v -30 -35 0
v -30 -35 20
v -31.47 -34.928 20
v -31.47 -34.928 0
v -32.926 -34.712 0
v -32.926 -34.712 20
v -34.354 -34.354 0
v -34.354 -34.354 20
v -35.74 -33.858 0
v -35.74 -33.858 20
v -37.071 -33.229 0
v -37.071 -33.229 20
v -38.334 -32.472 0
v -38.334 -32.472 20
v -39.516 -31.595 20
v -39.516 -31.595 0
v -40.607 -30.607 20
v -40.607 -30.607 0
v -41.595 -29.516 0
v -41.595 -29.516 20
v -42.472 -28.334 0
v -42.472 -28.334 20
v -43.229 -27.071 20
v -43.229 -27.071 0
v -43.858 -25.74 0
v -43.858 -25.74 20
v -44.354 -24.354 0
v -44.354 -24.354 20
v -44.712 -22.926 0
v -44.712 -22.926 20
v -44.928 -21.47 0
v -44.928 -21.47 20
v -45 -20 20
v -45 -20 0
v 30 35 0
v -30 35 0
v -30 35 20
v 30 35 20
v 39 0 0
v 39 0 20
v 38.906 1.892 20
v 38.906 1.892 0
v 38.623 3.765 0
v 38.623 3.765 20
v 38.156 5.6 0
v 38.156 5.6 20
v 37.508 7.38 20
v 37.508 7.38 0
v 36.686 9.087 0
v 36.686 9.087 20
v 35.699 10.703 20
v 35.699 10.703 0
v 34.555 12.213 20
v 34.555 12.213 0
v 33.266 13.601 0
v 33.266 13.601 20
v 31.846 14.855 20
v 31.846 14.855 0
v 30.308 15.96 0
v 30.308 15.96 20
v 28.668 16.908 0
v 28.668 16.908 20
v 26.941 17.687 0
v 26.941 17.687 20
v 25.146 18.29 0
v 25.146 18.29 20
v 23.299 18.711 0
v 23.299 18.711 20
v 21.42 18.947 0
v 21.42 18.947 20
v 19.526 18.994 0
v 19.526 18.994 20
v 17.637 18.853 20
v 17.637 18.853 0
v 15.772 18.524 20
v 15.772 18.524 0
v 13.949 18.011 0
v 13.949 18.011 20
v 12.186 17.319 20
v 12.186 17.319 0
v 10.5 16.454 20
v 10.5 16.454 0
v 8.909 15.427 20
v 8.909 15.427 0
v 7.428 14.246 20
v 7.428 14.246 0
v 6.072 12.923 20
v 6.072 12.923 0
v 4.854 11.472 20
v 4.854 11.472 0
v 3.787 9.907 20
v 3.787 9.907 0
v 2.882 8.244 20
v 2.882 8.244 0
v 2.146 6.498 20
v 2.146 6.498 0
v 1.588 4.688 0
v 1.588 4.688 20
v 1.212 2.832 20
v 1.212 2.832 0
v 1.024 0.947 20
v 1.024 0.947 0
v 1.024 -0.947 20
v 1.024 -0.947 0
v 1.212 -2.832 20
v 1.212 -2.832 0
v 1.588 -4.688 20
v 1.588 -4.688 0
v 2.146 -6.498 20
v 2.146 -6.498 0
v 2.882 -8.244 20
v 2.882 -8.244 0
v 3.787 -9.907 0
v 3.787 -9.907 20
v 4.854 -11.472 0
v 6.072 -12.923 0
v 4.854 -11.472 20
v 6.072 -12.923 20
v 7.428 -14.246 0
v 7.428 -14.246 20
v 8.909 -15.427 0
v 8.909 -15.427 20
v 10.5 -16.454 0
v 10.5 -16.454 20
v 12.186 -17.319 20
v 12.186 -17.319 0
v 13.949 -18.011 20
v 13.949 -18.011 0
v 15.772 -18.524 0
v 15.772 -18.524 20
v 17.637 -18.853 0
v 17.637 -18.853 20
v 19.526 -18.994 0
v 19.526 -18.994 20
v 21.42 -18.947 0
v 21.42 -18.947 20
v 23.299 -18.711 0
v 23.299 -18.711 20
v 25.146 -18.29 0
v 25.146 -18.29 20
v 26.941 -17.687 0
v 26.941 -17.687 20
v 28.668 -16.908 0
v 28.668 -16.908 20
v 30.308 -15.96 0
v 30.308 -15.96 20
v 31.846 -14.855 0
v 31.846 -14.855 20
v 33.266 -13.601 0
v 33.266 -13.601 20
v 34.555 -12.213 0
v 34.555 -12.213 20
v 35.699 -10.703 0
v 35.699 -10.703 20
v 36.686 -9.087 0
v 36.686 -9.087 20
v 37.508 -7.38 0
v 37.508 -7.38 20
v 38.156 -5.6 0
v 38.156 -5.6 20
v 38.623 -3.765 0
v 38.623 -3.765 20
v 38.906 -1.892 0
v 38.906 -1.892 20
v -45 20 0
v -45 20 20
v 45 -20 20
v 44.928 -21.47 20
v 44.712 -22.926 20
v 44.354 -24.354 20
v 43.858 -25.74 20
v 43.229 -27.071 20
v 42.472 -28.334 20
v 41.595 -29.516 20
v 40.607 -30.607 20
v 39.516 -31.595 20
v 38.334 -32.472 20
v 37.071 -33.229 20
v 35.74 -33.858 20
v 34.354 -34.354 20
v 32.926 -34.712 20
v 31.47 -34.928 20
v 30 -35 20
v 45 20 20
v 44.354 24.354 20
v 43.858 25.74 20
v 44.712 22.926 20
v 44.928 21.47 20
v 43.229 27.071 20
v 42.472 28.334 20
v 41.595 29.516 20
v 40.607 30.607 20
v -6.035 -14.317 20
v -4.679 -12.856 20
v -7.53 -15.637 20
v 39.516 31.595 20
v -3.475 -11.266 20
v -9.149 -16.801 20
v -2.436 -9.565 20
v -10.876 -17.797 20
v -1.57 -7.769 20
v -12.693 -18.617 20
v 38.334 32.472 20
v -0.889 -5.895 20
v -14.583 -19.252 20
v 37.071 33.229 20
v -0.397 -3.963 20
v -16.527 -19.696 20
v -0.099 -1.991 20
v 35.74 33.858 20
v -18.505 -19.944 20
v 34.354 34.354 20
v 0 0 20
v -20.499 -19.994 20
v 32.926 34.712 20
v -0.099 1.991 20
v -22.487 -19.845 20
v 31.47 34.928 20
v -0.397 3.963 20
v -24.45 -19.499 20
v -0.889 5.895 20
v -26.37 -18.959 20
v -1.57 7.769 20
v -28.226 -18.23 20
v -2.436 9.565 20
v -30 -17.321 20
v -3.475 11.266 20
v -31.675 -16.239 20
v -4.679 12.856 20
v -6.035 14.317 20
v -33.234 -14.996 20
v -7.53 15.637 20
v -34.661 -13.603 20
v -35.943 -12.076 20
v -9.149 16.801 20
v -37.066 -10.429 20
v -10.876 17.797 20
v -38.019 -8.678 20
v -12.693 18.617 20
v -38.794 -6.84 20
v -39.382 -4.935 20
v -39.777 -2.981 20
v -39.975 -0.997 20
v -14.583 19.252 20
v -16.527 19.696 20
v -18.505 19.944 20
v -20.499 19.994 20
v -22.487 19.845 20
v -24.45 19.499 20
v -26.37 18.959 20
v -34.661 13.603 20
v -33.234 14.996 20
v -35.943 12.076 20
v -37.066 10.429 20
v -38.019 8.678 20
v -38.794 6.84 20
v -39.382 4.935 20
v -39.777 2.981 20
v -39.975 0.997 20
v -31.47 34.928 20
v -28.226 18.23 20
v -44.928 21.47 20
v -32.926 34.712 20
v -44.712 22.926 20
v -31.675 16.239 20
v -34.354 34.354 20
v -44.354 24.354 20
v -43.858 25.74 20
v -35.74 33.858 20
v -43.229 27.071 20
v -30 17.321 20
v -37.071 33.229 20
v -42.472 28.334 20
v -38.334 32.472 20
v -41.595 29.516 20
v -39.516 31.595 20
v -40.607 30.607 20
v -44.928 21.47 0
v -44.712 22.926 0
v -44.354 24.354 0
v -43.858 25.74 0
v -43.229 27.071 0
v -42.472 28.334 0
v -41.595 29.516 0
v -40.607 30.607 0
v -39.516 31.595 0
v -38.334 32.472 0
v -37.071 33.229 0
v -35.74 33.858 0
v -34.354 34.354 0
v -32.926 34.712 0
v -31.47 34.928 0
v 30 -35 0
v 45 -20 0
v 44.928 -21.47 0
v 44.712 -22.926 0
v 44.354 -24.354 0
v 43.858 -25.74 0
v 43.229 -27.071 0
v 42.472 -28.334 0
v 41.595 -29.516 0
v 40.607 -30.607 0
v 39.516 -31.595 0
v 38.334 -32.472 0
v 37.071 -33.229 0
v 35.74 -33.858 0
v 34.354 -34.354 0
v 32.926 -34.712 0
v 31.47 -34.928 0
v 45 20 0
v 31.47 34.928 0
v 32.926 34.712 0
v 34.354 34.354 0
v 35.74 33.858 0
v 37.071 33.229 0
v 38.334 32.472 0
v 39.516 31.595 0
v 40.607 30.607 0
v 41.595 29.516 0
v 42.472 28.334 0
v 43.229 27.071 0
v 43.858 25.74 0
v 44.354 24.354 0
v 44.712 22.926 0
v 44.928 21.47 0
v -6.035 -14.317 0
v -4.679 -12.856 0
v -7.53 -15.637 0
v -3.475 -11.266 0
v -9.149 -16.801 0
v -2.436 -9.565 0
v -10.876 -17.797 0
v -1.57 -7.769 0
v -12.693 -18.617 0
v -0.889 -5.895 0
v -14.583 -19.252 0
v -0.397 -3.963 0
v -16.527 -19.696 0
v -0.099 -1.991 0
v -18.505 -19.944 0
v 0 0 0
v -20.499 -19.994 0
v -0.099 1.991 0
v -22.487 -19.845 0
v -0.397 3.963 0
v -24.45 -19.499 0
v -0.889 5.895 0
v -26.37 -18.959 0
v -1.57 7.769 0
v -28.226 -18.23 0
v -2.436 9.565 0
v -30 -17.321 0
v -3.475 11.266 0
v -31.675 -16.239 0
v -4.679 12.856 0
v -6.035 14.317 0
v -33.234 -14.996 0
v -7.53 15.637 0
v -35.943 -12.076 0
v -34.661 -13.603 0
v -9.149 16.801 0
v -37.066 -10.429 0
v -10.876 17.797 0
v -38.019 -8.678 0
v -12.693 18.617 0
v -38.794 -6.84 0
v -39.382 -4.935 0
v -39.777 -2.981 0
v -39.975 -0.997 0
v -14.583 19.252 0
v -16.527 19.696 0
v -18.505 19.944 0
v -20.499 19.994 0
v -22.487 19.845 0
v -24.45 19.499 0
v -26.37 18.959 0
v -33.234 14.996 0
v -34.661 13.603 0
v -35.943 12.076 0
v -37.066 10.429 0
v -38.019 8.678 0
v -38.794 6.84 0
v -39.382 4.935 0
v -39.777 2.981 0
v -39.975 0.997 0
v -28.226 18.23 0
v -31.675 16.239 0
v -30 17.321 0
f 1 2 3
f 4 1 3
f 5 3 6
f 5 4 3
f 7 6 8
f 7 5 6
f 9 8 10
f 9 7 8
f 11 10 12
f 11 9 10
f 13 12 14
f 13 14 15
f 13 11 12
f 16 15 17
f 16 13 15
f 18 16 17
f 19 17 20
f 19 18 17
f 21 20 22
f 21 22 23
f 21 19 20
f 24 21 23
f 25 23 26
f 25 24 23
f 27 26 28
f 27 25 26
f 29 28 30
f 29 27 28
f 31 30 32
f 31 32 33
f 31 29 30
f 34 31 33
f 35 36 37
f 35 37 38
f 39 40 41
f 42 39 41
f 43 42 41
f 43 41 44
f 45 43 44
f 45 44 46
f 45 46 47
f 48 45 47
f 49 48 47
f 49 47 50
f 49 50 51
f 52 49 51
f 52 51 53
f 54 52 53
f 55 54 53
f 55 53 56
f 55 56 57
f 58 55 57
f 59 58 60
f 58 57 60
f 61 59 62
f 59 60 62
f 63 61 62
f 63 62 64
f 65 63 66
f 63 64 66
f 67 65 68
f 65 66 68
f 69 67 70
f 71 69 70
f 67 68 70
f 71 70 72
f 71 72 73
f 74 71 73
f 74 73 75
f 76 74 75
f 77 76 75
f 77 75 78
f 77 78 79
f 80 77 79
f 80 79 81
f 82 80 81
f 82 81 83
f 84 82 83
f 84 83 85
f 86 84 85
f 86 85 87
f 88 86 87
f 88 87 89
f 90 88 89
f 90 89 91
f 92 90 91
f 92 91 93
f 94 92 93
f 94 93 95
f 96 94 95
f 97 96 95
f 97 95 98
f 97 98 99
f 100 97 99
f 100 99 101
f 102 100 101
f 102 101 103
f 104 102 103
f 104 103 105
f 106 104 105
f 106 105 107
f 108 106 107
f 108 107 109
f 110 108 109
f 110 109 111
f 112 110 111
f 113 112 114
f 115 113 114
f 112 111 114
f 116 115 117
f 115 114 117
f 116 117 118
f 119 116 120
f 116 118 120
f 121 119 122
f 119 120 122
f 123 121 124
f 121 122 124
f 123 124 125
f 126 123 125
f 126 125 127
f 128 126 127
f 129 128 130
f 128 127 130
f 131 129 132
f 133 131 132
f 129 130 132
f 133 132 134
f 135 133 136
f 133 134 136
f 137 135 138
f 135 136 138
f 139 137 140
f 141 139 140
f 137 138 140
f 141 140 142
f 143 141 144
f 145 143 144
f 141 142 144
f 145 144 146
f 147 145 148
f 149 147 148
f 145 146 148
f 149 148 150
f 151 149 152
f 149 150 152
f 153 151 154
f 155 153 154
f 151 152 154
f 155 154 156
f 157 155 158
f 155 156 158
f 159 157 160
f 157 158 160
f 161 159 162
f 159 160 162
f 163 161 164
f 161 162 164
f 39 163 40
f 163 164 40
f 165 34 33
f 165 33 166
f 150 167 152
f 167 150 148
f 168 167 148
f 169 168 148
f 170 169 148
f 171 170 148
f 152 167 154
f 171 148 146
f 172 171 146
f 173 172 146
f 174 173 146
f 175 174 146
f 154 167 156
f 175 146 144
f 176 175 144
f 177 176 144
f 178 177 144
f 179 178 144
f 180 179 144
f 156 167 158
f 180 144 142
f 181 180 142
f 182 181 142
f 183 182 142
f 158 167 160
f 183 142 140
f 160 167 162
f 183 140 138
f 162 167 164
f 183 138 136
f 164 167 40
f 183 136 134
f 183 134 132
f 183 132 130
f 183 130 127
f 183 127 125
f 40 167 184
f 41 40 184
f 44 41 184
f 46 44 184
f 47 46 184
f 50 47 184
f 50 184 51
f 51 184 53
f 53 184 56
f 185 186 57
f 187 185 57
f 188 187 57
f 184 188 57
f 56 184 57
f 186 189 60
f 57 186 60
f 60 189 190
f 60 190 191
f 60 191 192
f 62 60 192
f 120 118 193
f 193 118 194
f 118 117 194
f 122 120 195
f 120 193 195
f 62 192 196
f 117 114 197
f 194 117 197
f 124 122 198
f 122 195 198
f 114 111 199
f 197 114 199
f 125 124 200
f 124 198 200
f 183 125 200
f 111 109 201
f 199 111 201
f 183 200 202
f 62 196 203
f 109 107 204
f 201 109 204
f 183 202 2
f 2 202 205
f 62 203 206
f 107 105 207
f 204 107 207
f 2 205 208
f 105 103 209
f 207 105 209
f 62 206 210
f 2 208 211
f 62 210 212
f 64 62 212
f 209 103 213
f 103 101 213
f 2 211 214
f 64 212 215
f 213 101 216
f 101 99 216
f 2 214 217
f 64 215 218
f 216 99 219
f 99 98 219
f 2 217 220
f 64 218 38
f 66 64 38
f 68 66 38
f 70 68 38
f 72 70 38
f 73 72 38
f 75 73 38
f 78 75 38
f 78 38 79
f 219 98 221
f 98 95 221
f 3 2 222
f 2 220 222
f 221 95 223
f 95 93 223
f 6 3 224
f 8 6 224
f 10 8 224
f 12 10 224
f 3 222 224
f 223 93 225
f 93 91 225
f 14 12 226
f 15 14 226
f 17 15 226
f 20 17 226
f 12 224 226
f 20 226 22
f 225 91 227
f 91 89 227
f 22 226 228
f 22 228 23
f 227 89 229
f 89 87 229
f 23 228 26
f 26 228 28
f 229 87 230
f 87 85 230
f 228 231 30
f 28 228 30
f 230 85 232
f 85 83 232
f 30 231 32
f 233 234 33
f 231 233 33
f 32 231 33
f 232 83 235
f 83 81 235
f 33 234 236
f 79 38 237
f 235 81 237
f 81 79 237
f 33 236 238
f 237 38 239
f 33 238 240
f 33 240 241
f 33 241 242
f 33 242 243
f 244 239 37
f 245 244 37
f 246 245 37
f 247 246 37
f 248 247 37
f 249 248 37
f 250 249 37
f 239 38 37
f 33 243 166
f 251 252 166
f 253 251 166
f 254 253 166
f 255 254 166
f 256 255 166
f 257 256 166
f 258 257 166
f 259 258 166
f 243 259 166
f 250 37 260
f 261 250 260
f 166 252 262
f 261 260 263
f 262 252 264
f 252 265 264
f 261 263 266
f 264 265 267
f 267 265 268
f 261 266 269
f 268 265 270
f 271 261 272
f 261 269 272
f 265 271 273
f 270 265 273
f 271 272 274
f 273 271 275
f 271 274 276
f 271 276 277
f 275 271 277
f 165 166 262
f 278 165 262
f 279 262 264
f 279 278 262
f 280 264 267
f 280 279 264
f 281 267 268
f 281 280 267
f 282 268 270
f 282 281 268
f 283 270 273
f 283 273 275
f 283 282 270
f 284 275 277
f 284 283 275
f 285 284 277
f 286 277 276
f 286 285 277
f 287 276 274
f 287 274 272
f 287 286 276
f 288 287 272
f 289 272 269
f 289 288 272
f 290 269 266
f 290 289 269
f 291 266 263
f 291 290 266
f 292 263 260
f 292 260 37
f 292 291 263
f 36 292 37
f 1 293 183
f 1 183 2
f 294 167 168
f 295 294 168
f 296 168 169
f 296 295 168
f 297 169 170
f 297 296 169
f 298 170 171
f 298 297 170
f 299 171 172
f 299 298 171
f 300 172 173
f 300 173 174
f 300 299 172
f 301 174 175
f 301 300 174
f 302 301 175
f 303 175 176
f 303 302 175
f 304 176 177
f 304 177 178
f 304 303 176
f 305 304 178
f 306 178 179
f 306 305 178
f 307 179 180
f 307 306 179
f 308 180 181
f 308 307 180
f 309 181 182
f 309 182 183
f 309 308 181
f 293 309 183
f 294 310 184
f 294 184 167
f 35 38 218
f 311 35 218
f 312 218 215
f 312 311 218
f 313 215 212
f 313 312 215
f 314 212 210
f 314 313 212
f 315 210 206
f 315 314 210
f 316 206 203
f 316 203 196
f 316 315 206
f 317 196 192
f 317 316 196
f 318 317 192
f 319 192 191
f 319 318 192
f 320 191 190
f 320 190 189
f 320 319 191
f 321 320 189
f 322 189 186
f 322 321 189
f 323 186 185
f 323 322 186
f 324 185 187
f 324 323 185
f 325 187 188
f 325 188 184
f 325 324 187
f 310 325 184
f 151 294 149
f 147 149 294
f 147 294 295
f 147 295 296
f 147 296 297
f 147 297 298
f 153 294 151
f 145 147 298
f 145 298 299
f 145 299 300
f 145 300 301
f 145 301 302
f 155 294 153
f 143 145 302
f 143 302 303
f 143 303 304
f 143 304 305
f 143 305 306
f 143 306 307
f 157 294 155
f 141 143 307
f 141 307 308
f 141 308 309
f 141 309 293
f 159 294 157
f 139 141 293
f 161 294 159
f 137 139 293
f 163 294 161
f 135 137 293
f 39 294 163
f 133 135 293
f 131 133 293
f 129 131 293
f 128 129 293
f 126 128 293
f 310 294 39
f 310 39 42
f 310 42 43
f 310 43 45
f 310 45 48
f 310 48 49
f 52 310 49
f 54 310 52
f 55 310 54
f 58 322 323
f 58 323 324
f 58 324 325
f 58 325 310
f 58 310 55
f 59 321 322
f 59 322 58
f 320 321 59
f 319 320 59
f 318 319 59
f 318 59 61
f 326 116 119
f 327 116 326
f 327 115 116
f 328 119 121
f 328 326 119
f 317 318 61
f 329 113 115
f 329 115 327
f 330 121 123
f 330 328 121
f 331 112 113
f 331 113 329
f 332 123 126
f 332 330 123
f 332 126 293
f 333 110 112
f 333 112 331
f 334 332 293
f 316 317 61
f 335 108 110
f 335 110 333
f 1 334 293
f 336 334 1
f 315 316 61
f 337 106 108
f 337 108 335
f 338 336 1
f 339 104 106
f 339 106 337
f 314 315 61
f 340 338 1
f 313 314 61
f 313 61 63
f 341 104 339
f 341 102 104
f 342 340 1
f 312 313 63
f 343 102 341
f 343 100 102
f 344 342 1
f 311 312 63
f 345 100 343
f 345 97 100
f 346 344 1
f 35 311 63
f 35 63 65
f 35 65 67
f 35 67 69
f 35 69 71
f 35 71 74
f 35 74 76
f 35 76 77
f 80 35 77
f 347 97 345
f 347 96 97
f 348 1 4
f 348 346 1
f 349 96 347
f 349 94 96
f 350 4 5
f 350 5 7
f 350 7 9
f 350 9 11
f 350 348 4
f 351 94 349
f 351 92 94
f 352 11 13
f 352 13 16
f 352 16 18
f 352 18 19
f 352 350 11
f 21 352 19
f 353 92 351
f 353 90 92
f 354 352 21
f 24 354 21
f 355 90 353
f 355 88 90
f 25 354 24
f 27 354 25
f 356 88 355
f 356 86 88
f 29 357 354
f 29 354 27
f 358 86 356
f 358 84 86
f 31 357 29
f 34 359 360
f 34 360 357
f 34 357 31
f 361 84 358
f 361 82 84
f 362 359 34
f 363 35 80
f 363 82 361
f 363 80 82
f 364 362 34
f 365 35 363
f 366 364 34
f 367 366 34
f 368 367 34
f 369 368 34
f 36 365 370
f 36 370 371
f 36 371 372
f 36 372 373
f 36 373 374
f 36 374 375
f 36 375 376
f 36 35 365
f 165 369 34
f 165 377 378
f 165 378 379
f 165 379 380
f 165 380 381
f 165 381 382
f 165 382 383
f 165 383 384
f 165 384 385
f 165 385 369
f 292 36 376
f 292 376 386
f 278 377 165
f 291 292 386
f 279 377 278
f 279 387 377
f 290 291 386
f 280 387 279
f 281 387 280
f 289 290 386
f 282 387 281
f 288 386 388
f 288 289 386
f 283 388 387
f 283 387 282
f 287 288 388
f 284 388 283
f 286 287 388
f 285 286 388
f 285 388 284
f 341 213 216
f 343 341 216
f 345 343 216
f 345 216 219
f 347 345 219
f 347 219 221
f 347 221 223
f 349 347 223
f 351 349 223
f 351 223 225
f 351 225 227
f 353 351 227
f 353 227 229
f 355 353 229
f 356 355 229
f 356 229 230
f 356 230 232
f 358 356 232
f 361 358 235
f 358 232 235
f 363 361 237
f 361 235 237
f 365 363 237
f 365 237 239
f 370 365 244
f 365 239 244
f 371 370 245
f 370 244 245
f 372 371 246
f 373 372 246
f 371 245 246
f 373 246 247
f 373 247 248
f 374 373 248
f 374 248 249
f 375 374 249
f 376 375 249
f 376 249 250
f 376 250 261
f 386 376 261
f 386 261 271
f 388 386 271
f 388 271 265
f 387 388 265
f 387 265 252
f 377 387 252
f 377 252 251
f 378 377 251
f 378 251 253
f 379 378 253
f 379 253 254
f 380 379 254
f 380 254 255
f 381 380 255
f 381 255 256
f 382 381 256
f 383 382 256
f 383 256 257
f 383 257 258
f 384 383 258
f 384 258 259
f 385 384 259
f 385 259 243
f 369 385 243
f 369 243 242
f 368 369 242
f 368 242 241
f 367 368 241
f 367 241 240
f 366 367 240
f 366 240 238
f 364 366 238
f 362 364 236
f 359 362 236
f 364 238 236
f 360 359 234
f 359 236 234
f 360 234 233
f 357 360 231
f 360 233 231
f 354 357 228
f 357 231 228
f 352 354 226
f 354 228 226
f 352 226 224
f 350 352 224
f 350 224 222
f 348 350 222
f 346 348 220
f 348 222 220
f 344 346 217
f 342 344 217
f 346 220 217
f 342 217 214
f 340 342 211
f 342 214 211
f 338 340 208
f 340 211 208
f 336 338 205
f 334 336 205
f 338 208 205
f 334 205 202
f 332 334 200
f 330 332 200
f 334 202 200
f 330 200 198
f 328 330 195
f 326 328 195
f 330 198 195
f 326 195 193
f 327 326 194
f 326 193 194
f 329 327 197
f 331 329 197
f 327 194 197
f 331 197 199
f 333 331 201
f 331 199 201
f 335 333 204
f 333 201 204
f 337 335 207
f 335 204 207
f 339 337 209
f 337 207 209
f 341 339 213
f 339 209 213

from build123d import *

# Parameters (mm, degrees)
BOSS_EXTRUDE1_DEPTH     = 20
SKETCH3_R               = 20
CUT_EXTRUDE2_DEPTH      = 1
CUT_EXTRUDE2_DEPTH_BACK = 21
SKETCH4_R               = 19
CUT_EXTRUDE3_DEPTH      = 21


with BuildPart() as part:
    # Sketch1 → Boss-Extrude1 (new body)
    with BuildSketch(Plane.XY):
        with BuildLine():
            Line((30, -35), (-30, -35))
            ThreePointArc((-30, -35), (-40.606601718, -30.606601718), (-45, -20))
            Line((-45, -20), (-45, 20))
            ThreePointArc((-45, 20), (-40.606601718, 30.606601718), (-30, 35))
            Line((-30, 35), (30, 35))
            ThreePointArc((30, 35), (40.606601718, 30.606601718), (45, 20))
            Line((45, 20), (45, -20))
            ThreePointArc((45, -20), (40.606601718, -30.606601718), (30, -35))
        make_face()
    extrude(amount=BOSS_EXTRUDE1_DEPTH)

    # Sketch3 → Cut-Extrude2 (cut, two sides)
    with BuildSketch(Plane.XY.offset(20)) as cut_extrude2_sk:
        with Locations((-20, 0)):
            Circle(SKETCH3_R)
    extrude(amount=CUT_EXTRUDE2_DEPTH, mode=Mode.SUBTRACT)
    extrude(cut_extrude2_sk.sketch, amount=-CUT_EXTRUDE2_DEPTH_BACK, mode=Mode.SUBTRACT)

    # Sketch4 → Cut-Extrude3 (cut, through all)
    with BuildSketch(Plane.XY.offset(20)):
        with Locations((20, 0)):
            Circle(SKETCH4_R)
    extrude(amount=-CUT_EXTRUDE3_DEPTH, mode=Mode.SUBTRACT)


solid = part.part
